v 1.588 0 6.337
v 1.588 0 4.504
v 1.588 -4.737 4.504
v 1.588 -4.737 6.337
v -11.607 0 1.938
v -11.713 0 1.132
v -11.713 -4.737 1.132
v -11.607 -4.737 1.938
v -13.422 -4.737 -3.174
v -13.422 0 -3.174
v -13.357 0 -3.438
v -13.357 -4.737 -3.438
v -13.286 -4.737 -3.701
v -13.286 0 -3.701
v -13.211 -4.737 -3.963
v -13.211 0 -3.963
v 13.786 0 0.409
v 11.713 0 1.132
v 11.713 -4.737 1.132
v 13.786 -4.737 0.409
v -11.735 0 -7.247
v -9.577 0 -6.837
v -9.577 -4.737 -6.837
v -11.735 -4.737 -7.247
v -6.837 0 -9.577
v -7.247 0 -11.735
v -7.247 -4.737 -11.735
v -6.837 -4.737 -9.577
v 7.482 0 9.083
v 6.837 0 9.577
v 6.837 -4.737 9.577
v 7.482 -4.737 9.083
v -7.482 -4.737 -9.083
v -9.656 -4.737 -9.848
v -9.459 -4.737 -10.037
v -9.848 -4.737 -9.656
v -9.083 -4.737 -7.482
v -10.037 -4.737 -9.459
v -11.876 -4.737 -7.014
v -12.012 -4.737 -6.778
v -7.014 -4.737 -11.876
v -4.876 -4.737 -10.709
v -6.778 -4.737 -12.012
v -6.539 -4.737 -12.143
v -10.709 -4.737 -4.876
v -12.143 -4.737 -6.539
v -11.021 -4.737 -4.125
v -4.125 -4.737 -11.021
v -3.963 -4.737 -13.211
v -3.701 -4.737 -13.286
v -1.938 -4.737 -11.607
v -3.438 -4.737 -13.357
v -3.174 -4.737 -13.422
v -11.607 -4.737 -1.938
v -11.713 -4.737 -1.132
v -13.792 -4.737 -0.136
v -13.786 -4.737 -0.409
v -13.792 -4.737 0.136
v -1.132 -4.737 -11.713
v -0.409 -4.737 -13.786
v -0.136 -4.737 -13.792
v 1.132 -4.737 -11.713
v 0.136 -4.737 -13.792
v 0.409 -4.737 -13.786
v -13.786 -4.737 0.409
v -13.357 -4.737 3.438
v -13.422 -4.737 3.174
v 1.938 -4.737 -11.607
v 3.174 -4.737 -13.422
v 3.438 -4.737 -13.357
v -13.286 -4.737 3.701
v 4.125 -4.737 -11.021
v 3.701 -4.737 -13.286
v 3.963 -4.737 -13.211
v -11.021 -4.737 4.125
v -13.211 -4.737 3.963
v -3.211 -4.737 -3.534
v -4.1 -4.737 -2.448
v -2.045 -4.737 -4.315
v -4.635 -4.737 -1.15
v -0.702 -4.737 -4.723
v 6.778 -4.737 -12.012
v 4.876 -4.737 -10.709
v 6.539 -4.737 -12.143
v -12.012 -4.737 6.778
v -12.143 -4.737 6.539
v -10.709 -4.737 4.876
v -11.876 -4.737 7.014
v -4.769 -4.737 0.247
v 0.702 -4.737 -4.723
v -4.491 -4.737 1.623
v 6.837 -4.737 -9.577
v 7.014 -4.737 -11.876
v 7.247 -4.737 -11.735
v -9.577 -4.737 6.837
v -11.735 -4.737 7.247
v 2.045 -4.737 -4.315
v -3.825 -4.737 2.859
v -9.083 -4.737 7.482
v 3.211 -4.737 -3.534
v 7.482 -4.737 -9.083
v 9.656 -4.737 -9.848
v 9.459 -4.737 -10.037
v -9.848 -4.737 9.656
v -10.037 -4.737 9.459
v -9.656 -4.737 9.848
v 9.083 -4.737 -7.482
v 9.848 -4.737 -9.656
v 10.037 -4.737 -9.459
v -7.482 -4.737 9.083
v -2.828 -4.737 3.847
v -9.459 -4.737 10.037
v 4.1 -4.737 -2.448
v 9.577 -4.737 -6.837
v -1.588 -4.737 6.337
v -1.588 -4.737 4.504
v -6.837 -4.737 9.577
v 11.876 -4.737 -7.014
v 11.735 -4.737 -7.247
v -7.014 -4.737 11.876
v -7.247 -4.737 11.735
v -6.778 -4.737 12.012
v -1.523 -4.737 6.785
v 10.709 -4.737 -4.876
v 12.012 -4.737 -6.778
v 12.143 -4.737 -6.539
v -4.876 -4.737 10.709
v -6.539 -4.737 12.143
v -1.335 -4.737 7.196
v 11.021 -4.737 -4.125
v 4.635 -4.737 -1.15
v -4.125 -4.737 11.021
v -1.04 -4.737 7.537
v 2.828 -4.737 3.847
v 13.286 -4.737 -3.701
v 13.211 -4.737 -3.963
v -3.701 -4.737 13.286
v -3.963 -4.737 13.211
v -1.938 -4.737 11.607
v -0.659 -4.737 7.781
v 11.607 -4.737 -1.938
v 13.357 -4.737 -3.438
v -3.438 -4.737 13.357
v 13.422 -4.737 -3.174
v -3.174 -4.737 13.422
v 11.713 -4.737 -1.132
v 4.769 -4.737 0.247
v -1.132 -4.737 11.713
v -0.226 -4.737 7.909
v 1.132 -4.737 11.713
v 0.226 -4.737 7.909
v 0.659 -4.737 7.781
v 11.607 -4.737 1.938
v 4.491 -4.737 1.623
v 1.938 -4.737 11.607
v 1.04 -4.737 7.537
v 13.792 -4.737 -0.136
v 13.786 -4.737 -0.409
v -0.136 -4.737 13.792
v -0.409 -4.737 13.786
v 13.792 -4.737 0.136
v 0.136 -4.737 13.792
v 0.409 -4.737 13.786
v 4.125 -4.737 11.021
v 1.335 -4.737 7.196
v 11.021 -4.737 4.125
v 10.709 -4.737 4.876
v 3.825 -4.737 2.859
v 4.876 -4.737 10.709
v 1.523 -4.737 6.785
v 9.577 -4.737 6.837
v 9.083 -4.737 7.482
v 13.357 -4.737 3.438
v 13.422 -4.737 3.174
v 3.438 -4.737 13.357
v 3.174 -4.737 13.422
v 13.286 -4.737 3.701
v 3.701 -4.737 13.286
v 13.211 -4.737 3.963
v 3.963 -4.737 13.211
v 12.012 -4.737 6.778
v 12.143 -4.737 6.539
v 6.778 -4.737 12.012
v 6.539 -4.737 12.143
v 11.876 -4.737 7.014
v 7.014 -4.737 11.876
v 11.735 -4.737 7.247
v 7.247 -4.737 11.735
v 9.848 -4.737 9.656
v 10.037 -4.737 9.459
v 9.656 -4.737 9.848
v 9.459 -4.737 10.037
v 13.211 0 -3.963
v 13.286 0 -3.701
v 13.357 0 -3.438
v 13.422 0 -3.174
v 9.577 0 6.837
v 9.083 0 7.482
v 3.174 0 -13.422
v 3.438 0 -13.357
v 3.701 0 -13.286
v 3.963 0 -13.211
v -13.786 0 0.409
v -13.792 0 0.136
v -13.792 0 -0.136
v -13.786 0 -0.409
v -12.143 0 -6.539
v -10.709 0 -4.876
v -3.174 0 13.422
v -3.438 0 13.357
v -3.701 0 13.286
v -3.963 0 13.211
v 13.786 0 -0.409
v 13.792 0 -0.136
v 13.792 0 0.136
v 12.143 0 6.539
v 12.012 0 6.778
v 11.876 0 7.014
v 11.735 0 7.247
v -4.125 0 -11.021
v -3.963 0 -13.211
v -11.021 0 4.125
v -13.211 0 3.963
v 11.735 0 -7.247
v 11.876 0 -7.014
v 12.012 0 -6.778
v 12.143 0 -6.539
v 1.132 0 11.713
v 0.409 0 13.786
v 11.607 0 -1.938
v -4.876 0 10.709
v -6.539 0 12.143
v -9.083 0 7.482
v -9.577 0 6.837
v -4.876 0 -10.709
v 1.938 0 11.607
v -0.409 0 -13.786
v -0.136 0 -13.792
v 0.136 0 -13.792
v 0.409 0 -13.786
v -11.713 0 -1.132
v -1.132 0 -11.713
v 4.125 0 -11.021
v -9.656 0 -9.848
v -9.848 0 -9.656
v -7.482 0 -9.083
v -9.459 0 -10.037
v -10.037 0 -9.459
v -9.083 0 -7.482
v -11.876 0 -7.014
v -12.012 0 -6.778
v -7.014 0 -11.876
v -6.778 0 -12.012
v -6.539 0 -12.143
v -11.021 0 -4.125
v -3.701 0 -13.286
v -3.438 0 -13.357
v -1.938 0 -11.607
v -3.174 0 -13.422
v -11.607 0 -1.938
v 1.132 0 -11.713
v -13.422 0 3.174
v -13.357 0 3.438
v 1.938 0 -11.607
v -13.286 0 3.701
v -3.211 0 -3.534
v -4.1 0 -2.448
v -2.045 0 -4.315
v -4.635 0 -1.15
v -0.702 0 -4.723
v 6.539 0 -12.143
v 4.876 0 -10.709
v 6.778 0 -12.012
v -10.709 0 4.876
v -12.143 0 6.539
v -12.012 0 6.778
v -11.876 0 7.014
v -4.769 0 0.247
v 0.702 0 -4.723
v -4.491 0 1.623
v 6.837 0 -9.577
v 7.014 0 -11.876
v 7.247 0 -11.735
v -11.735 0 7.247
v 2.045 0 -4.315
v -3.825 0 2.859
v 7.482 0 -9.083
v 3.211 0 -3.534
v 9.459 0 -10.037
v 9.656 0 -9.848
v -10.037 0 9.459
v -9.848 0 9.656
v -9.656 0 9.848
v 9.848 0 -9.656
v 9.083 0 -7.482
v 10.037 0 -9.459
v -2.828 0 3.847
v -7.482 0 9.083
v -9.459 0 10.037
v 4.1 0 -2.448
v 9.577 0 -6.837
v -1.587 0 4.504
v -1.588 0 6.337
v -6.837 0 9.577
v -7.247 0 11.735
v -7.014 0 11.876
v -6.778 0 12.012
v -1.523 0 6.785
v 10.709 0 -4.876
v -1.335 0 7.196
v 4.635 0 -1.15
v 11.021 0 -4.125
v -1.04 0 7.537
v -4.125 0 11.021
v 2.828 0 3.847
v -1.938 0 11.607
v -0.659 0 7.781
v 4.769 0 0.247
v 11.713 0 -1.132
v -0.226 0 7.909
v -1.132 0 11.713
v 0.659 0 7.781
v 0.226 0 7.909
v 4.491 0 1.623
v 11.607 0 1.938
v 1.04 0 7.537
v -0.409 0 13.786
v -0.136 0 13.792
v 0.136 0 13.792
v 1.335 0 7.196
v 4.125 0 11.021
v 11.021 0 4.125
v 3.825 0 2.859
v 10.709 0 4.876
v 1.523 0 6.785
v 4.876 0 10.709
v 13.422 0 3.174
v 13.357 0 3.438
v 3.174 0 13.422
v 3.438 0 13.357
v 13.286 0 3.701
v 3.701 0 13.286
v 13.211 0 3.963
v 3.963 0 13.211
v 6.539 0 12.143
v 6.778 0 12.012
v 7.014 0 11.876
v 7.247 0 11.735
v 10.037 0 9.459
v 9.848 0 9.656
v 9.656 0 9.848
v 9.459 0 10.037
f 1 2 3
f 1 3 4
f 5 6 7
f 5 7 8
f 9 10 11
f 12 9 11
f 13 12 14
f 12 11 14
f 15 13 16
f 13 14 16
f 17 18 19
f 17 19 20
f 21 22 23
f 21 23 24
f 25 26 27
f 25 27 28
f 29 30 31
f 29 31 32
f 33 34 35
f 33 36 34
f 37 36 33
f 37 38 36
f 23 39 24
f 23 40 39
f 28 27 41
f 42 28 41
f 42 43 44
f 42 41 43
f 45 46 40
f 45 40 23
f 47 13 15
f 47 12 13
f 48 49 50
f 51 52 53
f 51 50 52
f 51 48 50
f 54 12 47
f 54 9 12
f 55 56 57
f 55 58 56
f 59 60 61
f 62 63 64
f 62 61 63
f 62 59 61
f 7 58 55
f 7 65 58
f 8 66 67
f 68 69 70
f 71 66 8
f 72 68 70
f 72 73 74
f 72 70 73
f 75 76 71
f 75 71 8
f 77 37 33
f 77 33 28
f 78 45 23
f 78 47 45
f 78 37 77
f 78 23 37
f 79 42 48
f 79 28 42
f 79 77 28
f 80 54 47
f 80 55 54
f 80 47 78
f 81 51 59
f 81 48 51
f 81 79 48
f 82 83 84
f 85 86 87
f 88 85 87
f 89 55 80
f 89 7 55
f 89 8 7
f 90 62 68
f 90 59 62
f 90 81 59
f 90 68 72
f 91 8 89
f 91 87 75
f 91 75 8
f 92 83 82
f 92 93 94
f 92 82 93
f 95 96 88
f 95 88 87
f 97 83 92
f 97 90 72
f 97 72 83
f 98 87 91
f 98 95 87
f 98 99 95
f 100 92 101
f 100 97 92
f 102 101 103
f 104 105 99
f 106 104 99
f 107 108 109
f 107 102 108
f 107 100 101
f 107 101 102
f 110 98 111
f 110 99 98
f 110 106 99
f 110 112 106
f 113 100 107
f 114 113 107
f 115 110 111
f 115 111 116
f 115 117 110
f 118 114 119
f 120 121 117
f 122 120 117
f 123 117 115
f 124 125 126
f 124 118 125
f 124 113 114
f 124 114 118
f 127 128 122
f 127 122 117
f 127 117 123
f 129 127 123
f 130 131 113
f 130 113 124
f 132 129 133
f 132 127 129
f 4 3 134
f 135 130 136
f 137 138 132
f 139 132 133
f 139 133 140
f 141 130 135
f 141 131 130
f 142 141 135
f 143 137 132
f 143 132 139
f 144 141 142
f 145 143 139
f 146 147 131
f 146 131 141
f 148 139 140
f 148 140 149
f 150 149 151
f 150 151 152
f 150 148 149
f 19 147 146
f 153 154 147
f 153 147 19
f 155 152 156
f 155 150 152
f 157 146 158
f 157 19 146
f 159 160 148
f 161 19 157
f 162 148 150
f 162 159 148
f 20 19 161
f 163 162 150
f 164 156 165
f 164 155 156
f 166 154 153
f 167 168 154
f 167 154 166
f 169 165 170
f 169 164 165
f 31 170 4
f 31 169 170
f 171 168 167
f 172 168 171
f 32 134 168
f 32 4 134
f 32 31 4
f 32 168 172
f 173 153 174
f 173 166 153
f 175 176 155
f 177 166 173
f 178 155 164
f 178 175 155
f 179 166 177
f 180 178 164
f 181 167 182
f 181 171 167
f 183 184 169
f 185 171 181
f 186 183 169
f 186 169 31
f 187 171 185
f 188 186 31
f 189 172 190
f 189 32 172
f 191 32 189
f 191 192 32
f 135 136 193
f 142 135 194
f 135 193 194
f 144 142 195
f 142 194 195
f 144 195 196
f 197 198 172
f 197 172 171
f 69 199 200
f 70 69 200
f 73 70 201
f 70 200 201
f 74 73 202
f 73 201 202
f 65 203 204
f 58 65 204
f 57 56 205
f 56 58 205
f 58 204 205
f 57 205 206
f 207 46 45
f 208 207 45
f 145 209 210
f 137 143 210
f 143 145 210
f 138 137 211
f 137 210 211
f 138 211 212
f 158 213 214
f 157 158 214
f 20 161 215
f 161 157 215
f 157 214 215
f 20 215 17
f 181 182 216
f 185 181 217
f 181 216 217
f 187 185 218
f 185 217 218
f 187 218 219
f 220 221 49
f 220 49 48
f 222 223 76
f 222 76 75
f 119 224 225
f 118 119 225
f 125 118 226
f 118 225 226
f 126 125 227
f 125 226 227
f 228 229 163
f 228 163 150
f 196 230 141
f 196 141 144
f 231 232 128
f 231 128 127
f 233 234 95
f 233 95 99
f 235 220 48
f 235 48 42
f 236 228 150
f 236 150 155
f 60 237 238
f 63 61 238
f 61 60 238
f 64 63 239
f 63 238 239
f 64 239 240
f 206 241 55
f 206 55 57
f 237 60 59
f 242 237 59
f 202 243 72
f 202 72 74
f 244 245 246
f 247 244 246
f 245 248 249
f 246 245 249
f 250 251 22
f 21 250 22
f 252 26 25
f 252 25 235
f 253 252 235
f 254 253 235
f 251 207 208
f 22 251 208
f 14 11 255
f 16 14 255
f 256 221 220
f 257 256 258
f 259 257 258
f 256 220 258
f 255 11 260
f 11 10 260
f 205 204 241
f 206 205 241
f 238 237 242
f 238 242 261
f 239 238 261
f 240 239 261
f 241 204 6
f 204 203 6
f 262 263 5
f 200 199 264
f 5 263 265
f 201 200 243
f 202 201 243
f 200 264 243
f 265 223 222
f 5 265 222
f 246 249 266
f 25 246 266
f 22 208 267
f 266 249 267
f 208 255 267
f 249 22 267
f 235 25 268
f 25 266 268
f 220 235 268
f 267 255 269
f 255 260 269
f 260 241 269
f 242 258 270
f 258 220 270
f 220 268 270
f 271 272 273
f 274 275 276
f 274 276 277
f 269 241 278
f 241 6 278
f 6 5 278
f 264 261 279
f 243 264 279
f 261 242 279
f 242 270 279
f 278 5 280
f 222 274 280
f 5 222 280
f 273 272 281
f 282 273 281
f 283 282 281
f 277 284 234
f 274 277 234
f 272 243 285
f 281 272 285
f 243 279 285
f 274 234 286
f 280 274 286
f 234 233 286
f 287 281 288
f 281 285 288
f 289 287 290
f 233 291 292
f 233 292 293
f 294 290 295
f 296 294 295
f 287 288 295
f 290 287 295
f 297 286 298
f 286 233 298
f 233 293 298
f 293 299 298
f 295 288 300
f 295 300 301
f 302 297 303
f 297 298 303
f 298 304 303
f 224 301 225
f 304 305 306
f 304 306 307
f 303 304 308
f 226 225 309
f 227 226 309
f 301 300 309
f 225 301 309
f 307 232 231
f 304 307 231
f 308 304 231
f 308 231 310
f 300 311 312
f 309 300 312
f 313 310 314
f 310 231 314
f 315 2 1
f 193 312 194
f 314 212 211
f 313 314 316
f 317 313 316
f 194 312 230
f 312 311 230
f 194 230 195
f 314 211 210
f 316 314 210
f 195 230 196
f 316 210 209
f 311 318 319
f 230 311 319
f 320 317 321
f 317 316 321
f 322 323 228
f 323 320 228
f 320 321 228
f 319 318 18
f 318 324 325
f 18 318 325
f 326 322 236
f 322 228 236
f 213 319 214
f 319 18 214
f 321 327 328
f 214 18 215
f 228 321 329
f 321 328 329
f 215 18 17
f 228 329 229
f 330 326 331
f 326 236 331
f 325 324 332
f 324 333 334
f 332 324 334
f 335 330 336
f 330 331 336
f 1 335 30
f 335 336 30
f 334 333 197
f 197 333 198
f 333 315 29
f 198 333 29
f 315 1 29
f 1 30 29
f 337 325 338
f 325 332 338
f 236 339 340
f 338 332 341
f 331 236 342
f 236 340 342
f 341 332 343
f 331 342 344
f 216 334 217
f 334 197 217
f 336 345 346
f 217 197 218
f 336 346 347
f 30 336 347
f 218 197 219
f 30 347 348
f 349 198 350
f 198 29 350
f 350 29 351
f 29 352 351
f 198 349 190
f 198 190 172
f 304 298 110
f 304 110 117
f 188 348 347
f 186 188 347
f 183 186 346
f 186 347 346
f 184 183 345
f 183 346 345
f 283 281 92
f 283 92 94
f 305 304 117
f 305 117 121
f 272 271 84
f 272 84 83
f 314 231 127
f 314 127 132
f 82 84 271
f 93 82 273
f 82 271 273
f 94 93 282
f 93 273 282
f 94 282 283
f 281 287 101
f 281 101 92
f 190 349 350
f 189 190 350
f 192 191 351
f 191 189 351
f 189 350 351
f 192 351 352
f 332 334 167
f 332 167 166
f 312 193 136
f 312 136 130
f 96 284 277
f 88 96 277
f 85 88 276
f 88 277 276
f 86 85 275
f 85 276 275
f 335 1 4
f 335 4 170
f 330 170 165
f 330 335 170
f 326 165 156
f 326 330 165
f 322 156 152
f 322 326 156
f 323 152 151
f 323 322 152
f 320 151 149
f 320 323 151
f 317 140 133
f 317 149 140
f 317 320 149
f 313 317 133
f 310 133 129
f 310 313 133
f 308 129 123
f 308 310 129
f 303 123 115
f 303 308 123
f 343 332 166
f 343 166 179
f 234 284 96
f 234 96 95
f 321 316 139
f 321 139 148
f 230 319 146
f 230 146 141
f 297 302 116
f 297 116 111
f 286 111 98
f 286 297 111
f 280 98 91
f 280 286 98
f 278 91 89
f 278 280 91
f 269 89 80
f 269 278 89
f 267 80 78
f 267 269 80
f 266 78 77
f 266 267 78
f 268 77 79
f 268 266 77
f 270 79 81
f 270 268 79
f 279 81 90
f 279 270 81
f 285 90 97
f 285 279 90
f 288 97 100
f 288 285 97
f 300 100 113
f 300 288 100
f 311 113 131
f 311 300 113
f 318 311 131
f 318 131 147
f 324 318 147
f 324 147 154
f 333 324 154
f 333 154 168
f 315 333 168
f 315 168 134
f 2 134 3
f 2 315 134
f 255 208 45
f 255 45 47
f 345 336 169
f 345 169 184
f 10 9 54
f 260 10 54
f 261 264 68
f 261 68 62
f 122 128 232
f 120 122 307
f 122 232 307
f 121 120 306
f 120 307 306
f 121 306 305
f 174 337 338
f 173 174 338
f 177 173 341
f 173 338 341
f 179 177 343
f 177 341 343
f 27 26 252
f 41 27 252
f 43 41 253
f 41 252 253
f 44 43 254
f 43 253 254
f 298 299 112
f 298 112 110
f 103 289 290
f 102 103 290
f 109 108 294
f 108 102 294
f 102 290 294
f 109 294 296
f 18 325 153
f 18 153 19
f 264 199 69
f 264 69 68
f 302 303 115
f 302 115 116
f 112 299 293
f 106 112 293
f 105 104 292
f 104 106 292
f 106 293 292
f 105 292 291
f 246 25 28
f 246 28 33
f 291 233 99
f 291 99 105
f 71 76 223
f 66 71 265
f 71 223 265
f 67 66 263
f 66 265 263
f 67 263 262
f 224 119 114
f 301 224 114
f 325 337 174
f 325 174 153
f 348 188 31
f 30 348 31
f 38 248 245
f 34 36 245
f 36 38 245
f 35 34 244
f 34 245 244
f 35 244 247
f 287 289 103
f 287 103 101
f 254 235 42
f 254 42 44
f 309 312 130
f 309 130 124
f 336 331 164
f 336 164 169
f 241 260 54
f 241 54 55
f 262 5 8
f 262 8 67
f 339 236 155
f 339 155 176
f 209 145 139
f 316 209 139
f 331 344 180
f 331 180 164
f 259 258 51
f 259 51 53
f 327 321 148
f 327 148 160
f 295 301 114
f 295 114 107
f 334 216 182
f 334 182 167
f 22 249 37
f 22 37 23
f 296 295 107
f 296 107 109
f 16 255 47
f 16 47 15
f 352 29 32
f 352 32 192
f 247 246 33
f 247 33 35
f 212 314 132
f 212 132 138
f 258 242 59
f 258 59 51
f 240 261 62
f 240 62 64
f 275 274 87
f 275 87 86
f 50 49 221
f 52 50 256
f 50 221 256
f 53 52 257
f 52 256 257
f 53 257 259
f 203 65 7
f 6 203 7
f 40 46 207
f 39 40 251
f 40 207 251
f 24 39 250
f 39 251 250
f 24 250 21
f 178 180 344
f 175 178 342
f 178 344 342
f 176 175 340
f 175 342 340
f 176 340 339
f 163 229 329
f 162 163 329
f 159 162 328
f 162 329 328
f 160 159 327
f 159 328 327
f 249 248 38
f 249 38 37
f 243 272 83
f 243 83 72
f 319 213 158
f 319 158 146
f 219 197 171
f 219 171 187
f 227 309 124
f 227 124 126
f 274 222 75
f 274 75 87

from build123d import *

# Parameters (mm, degrees)
F0_R            = 13.7922
F0_R_2          = 4.7752
F1_DEPTH        = 4.7371
F3_DEPTH        = 4.7381
F5_DEPTH        = 4.7381
F5_COPIES_COUNT = 24


# Not quite as in the source:
# - a pattern or mirror of a feature is missing from the dataset's text; its kind, count and spacing are read off the source's solid


with BuildPart() as f1:
    # F0 (on Front) → F1 (new body)
    with BuildSketch(Plane.XZ):
        Circle(F0_R)
        Circle(F0_R_2, mode=Mode.SUBTRACT)
    extrude(amount=F1_DEPTH)

    # F2 (on Front) → F3 (cut, through all)
    with BuildSketch(Plane.XZ):
        with BuildLine():
            Line((-1.5875, 6.3373), (-1.5875, 0))
            Line((-1.5875, 0), (1.5875, 0))
            Line((1.5875, 0), (1.5875, 6.3373))
            ThreePointArc((1.5875, 6.3373), (0, 7.9248), (-1.5875, 6.3373))
        make_face()
    extrude(amount=F3_DEPTH, mode=Mode.SUBTRACT)

    # F4 (on Front) → F5 (cut, through all)
    with BuildSketch(Plane.XZ):
        with BuildLine():
            Line((0.4064, 13.7922), (1.1320909341, 11.7126357032))
            Line((1.1320909341, 11.7126357032), (1.9379373174, 11.6065440142))
            Line((1.9379373174, 11.6065440142), (3.1771317781, 13.4274262413))
            ThreePointArc((3.1771317781, 13.4274262413), (1.8061892107, 13.7193691256), (0.4064, 13.7922))
        make_face()
    f5 = extrude(amount=F5_DEPTH, mode=Mode.SUBTRACT)

    # F5_copies: F5 ×24 about axis
    f5_copies_axis = Axis((0, 0, 0), (0, 1, 0))
    for i in range(1, F5_COPIES_COUNT):
        add(f5.rotate(f5_copies_axis, i * 360 / F5_COPIES_COUNT), mode=Mode.SUBTRACT)


solid = f1.part
